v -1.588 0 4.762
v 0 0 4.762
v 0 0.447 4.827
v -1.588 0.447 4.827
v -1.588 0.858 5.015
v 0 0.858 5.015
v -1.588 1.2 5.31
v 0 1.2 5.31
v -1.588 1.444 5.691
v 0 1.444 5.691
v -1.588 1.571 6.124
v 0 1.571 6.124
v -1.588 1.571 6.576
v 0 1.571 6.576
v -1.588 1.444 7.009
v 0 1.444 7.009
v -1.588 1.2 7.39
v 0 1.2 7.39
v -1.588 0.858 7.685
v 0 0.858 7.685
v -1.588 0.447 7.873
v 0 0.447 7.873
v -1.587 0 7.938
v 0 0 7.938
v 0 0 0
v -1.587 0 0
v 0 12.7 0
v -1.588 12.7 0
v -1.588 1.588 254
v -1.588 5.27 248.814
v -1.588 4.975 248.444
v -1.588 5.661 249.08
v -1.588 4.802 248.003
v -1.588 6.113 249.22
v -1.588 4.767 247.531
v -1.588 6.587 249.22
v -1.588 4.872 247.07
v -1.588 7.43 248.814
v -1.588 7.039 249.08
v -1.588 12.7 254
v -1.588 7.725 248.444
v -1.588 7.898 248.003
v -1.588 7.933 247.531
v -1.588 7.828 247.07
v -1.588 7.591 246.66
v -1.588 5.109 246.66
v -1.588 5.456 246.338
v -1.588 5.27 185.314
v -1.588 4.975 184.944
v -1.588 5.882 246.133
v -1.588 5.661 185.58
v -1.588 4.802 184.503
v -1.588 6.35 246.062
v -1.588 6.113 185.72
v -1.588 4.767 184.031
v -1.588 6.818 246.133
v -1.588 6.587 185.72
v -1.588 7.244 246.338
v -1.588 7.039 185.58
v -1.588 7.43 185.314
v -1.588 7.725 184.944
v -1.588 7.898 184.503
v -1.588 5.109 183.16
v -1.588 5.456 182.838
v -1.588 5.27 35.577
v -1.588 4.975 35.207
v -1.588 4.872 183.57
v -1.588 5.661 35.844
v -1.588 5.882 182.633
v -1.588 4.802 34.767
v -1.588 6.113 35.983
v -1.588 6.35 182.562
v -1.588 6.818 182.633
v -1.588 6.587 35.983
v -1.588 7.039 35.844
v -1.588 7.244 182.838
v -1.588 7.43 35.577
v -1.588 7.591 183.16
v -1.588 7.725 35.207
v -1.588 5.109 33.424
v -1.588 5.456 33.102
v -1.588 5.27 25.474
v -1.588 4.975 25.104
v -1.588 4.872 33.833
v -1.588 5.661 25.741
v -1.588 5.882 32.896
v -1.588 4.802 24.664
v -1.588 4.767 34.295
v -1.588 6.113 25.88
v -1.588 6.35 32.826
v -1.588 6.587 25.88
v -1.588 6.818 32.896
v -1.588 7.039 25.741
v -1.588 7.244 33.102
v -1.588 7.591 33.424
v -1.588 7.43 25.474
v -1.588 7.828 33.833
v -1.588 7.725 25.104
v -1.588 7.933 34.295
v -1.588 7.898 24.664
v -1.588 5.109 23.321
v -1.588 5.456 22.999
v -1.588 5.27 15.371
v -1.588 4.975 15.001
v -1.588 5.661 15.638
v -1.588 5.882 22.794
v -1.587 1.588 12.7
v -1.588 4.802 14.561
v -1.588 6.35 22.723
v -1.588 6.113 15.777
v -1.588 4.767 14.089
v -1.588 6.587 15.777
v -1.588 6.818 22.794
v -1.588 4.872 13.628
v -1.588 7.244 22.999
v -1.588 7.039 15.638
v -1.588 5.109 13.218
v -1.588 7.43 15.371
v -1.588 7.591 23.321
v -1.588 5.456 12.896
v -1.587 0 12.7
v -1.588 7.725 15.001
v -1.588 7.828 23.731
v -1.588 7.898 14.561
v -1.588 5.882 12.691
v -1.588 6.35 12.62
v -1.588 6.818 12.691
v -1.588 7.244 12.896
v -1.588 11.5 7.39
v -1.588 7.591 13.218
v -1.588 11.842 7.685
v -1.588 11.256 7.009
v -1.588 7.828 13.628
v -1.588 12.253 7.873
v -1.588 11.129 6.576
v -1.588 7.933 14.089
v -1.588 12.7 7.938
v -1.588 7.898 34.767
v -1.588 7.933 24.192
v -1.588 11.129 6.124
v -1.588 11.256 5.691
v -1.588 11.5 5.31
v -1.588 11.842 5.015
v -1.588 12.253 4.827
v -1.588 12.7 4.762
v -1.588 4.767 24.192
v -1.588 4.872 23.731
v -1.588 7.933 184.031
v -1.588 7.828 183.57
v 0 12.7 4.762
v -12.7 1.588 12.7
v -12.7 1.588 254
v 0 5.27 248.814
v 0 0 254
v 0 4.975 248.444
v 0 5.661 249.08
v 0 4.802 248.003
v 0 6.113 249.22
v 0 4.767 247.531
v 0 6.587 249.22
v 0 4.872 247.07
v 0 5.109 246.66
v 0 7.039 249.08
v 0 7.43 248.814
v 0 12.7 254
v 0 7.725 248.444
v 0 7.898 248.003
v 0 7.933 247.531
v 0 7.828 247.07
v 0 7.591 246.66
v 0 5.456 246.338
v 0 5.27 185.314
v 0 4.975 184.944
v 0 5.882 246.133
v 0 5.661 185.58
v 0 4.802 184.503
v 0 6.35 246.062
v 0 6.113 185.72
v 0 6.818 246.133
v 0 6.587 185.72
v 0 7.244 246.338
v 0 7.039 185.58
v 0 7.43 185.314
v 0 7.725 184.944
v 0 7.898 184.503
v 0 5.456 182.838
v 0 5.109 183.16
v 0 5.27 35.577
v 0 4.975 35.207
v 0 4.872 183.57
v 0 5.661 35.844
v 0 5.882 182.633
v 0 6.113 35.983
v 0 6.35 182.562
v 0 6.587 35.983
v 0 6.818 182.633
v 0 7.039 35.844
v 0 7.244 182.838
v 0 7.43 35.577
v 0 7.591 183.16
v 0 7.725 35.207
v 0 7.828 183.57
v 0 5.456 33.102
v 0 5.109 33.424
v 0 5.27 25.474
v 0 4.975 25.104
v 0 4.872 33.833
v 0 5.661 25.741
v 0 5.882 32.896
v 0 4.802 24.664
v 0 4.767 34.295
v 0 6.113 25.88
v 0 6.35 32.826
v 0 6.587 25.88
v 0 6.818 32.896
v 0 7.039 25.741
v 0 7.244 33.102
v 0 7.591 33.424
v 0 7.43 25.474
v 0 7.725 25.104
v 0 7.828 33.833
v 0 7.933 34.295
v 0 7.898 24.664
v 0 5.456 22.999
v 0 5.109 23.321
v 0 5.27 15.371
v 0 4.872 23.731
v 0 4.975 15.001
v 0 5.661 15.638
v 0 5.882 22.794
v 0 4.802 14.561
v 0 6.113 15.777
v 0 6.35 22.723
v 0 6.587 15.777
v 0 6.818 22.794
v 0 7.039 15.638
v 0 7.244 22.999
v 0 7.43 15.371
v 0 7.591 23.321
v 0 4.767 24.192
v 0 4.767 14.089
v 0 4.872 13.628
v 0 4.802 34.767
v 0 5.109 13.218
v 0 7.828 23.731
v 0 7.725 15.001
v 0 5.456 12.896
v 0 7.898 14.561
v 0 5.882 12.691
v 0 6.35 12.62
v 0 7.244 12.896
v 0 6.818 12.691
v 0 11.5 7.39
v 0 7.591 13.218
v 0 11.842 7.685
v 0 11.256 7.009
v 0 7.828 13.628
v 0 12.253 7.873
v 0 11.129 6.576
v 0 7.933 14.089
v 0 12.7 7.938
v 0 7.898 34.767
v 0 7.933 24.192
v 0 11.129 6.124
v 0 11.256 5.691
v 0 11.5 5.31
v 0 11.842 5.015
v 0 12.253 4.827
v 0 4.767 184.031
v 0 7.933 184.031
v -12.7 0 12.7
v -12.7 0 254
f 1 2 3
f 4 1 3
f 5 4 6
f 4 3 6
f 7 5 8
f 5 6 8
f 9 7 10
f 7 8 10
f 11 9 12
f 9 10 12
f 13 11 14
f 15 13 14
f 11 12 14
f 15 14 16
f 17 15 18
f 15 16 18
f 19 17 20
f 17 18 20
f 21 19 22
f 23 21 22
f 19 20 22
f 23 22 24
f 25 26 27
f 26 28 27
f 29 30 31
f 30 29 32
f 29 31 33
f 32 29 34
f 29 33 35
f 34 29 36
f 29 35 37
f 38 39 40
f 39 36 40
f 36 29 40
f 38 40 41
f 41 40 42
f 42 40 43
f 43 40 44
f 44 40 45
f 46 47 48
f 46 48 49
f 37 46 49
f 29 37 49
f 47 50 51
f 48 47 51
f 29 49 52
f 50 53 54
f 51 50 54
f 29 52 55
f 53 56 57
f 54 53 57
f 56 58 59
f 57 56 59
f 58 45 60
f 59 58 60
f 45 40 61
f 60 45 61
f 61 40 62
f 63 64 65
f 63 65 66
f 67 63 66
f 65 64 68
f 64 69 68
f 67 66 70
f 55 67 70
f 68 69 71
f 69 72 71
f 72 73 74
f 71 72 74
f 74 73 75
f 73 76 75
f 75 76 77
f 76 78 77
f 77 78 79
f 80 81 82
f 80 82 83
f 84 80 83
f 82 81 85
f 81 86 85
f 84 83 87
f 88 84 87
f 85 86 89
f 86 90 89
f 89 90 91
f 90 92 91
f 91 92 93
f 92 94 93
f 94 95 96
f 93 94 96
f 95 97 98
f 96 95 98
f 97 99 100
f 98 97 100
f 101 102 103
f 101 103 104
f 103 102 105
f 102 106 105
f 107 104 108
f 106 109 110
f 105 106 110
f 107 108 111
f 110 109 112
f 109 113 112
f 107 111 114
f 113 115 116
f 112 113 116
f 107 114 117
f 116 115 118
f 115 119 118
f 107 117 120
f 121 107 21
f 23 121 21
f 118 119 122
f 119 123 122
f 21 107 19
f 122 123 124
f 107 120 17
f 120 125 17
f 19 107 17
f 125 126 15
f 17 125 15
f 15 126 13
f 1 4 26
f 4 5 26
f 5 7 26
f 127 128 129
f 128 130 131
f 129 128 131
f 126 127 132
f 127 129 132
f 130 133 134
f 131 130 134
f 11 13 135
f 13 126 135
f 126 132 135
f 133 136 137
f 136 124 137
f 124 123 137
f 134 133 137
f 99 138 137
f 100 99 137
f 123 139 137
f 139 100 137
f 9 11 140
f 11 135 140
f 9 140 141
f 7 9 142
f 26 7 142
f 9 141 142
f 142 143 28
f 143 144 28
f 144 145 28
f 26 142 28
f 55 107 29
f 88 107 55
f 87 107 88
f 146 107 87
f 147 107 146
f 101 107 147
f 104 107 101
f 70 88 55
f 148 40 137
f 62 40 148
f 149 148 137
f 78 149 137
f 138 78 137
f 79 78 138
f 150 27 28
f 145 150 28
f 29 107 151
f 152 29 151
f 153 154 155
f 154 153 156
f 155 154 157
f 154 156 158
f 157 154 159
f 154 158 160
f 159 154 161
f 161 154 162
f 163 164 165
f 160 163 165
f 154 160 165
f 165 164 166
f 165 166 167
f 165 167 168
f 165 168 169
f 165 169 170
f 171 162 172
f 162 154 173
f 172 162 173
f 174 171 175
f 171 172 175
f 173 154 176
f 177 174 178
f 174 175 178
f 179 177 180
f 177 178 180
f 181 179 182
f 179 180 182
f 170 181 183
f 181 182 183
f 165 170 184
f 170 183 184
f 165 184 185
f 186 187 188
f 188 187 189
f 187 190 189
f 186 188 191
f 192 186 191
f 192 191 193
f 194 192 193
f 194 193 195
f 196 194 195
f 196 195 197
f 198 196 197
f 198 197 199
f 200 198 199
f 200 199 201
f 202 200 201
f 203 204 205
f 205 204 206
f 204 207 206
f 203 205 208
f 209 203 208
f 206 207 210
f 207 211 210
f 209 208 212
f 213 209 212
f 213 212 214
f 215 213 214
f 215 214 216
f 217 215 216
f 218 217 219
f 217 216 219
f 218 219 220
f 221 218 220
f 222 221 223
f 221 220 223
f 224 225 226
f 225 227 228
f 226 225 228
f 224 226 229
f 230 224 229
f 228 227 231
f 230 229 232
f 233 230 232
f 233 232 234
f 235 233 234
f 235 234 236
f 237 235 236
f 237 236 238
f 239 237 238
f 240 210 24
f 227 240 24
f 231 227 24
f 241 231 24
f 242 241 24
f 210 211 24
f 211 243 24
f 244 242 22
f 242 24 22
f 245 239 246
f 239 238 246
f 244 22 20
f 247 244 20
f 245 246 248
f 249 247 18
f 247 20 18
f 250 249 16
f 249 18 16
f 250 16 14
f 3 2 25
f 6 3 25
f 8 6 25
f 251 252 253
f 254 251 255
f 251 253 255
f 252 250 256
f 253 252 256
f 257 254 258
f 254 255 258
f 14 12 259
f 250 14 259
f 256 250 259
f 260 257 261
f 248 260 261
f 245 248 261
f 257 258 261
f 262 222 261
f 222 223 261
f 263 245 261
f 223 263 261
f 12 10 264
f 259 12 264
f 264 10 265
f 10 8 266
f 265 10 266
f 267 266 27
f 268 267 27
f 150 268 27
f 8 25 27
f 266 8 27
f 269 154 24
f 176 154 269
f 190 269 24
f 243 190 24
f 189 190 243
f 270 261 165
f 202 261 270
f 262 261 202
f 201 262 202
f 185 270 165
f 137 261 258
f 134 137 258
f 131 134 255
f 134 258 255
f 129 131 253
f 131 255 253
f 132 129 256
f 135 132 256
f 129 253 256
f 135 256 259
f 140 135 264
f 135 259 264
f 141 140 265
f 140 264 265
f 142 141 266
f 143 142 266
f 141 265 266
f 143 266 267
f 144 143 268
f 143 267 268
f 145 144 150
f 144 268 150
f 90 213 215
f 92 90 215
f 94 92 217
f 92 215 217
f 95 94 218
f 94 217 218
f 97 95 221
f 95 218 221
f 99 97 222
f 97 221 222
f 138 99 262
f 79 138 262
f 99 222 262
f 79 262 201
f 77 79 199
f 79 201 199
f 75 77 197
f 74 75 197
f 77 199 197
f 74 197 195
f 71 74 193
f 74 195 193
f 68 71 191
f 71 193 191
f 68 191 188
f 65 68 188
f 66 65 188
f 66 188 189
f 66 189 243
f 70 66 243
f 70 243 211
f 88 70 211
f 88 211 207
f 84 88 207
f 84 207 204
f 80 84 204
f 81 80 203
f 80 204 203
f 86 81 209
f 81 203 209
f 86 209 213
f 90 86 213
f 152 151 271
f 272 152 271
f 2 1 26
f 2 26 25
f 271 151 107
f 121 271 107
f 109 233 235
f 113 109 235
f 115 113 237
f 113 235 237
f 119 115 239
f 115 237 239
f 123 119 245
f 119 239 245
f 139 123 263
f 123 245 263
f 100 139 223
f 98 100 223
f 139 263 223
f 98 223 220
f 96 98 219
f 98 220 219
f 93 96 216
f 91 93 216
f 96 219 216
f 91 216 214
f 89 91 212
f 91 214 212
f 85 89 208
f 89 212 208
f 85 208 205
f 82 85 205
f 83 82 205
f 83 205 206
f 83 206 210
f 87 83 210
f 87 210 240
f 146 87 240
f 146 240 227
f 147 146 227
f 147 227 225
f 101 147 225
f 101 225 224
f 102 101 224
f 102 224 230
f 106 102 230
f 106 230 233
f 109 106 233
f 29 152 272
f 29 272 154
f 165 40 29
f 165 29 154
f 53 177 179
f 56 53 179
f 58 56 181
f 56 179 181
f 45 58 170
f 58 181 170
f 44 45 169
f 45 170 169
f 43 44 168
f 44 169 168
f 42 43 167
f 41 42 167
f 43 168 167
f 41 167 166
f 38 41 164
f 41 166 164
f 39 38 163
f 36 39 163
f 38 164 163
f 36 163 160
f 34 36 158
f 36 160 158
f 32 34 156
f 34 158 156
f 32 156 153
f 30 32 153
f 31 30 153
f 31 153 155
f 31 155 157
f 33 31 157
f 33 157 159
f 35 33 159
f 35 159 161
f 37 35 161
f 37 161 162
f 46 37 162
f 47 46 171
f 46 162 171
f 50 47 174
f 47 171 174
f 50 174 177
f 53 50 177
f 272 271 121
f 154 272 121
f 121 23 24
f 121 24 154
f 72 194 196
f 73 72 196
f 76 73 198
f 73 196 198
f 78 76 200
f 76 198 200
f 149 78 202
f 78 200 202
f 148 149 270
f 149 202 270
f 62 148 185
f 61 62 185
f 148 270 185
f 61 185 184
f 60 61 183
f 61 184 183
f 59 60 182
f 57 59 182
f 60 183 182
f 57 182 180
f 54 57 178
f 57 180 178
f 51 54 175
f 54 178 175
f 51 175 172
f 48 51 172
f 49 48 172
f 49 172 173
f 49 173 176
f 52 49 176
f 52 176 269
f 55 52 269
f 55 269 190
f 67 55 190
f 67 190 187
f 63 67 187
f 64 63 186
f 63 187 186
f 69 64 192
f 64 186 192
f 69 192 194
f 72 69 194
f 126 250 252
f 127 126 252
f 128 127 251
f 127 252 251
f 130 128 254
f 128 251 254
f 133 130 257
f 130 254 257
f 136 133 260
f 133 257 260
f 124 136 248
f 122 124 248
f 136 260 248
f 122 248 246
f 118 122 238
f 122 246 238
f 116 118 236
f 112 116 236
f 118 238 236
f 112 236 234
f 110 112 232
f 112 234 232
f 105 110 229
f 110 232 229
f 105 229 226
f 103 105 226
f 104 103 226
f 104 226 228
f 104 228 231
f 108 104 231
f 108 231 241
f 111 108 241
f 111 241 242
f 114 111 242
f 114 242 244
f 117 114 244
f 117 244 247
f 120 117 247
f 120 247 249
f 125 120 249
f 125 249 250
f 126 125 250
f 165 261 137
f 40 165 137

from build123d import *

# Parameters (mm, degrees)
EXTRUDE1_DEPTH     = 254
SKETCH2_R          = 1.5875
EXTRUDE2_DEPTH     = 1.5875
SKETCH3_R          = 1.5875
CUT_EXTRUDE3_DEPTH = 255.634208228
SKETCH5_W          = 11.1125
SKETCH5_H          = 12.7
CUT_EXTRUDE4_DEPTH = 1.5875
SKETCH6_R          = 1.5875
CUT_EXTRUDE5_DEPTH = 1.5875
SKETCH7_R          = 1.5875
CUT_EXTRUDE6_DEPTH = 1.5875


with BuildPart() as part:
    # Sketch1 → Extrude1 (new body)
    with BuildSketch(Plane.XY):
        Polygon((0, 0), (0, 12.7), (-1.5875, 12.7), (-1.5875, 1.5875), (-12.7, 1.5875), (-12.7, 0), align=None)
    extrude(amount=EXTRUDE1_DEPTH)

    # Sketch2 → Extrude2 (cut)
    with BuildSketch(Plane(origin=(0, 0, 0), x_dir=(0, 0, -1), z_dir=(1, 0, 0))):
        with Locations((-247.65, 6.35)):
            Circle(SKETCH2_R)
        with Locations((-184.15, 6.35)):
            Circle(SKETCH2_R)
    extrude(amount=-EXTRUDE2_DEPTH, mode=Mode.SUBTRACT)

    # Sketch3 → Cut-Extrude3 (cut, through all)
    with BuildSketch(Plane(origin=(0, 0, 0), x_dir=(0, 0, -1), z_dir=(1, 0, 0))):
        with Locations((-24.310512242, 6.35)):
            Circle(SKETCH3_R)
        with Locations((-14.207724106, 6.35)):
            Circle(SKETCH3_R)
    extrude(amount=-CUT_EXTRUDE3_DEPTH, mode=Mode.SUBTRACT)

    # Sketch5 → Cut-Extrude4 (cut)
    with BuildSketch(Plane(origin=(0, 1.5875, 0), x_dir=(1, 0, 0), z_dir=(0, 1, 0))):
        with Locations((-7.14375, -6.35)):
            Rectangle(SKETCH5_W, SKETCH5_H)
    extrude(amount=-CUT_EXTRUDE4_DEPTH, mode=Mode.SUBTRACT)

    # Sketch6 → Cut-Extrude5 (cut)
    with BuildSketch(Plane(origin=(0, 0, 0), x_dir=(0, 0, -1), z_dir=(1, 0, 0))):
        with Locations((-6.35, 12.7)):
            Circle(SKETCH6_R)
        with Locations((-6.35, 0)):
            Circle(SKETCH6_R)
    extrude(amount=-CUT_EXTRUDE5_DEPTH, mode=Mode.SUBTRACT)

    # Sketch7 → Cut-Extrude6 (cut)
    with BuildSketch(Plane(origin=(0, 0, 0), x_dir=(0, 0, -1), z_dir=(1, 0, 0))):
        with Locations((-34.413300378, 6.35)):
            Circle(SKETCH7_R)
    extrude(amount=-CUT_EXTRUDE6_DEPTH, mode=Mode.SUBTRACT)


solid = part.part
